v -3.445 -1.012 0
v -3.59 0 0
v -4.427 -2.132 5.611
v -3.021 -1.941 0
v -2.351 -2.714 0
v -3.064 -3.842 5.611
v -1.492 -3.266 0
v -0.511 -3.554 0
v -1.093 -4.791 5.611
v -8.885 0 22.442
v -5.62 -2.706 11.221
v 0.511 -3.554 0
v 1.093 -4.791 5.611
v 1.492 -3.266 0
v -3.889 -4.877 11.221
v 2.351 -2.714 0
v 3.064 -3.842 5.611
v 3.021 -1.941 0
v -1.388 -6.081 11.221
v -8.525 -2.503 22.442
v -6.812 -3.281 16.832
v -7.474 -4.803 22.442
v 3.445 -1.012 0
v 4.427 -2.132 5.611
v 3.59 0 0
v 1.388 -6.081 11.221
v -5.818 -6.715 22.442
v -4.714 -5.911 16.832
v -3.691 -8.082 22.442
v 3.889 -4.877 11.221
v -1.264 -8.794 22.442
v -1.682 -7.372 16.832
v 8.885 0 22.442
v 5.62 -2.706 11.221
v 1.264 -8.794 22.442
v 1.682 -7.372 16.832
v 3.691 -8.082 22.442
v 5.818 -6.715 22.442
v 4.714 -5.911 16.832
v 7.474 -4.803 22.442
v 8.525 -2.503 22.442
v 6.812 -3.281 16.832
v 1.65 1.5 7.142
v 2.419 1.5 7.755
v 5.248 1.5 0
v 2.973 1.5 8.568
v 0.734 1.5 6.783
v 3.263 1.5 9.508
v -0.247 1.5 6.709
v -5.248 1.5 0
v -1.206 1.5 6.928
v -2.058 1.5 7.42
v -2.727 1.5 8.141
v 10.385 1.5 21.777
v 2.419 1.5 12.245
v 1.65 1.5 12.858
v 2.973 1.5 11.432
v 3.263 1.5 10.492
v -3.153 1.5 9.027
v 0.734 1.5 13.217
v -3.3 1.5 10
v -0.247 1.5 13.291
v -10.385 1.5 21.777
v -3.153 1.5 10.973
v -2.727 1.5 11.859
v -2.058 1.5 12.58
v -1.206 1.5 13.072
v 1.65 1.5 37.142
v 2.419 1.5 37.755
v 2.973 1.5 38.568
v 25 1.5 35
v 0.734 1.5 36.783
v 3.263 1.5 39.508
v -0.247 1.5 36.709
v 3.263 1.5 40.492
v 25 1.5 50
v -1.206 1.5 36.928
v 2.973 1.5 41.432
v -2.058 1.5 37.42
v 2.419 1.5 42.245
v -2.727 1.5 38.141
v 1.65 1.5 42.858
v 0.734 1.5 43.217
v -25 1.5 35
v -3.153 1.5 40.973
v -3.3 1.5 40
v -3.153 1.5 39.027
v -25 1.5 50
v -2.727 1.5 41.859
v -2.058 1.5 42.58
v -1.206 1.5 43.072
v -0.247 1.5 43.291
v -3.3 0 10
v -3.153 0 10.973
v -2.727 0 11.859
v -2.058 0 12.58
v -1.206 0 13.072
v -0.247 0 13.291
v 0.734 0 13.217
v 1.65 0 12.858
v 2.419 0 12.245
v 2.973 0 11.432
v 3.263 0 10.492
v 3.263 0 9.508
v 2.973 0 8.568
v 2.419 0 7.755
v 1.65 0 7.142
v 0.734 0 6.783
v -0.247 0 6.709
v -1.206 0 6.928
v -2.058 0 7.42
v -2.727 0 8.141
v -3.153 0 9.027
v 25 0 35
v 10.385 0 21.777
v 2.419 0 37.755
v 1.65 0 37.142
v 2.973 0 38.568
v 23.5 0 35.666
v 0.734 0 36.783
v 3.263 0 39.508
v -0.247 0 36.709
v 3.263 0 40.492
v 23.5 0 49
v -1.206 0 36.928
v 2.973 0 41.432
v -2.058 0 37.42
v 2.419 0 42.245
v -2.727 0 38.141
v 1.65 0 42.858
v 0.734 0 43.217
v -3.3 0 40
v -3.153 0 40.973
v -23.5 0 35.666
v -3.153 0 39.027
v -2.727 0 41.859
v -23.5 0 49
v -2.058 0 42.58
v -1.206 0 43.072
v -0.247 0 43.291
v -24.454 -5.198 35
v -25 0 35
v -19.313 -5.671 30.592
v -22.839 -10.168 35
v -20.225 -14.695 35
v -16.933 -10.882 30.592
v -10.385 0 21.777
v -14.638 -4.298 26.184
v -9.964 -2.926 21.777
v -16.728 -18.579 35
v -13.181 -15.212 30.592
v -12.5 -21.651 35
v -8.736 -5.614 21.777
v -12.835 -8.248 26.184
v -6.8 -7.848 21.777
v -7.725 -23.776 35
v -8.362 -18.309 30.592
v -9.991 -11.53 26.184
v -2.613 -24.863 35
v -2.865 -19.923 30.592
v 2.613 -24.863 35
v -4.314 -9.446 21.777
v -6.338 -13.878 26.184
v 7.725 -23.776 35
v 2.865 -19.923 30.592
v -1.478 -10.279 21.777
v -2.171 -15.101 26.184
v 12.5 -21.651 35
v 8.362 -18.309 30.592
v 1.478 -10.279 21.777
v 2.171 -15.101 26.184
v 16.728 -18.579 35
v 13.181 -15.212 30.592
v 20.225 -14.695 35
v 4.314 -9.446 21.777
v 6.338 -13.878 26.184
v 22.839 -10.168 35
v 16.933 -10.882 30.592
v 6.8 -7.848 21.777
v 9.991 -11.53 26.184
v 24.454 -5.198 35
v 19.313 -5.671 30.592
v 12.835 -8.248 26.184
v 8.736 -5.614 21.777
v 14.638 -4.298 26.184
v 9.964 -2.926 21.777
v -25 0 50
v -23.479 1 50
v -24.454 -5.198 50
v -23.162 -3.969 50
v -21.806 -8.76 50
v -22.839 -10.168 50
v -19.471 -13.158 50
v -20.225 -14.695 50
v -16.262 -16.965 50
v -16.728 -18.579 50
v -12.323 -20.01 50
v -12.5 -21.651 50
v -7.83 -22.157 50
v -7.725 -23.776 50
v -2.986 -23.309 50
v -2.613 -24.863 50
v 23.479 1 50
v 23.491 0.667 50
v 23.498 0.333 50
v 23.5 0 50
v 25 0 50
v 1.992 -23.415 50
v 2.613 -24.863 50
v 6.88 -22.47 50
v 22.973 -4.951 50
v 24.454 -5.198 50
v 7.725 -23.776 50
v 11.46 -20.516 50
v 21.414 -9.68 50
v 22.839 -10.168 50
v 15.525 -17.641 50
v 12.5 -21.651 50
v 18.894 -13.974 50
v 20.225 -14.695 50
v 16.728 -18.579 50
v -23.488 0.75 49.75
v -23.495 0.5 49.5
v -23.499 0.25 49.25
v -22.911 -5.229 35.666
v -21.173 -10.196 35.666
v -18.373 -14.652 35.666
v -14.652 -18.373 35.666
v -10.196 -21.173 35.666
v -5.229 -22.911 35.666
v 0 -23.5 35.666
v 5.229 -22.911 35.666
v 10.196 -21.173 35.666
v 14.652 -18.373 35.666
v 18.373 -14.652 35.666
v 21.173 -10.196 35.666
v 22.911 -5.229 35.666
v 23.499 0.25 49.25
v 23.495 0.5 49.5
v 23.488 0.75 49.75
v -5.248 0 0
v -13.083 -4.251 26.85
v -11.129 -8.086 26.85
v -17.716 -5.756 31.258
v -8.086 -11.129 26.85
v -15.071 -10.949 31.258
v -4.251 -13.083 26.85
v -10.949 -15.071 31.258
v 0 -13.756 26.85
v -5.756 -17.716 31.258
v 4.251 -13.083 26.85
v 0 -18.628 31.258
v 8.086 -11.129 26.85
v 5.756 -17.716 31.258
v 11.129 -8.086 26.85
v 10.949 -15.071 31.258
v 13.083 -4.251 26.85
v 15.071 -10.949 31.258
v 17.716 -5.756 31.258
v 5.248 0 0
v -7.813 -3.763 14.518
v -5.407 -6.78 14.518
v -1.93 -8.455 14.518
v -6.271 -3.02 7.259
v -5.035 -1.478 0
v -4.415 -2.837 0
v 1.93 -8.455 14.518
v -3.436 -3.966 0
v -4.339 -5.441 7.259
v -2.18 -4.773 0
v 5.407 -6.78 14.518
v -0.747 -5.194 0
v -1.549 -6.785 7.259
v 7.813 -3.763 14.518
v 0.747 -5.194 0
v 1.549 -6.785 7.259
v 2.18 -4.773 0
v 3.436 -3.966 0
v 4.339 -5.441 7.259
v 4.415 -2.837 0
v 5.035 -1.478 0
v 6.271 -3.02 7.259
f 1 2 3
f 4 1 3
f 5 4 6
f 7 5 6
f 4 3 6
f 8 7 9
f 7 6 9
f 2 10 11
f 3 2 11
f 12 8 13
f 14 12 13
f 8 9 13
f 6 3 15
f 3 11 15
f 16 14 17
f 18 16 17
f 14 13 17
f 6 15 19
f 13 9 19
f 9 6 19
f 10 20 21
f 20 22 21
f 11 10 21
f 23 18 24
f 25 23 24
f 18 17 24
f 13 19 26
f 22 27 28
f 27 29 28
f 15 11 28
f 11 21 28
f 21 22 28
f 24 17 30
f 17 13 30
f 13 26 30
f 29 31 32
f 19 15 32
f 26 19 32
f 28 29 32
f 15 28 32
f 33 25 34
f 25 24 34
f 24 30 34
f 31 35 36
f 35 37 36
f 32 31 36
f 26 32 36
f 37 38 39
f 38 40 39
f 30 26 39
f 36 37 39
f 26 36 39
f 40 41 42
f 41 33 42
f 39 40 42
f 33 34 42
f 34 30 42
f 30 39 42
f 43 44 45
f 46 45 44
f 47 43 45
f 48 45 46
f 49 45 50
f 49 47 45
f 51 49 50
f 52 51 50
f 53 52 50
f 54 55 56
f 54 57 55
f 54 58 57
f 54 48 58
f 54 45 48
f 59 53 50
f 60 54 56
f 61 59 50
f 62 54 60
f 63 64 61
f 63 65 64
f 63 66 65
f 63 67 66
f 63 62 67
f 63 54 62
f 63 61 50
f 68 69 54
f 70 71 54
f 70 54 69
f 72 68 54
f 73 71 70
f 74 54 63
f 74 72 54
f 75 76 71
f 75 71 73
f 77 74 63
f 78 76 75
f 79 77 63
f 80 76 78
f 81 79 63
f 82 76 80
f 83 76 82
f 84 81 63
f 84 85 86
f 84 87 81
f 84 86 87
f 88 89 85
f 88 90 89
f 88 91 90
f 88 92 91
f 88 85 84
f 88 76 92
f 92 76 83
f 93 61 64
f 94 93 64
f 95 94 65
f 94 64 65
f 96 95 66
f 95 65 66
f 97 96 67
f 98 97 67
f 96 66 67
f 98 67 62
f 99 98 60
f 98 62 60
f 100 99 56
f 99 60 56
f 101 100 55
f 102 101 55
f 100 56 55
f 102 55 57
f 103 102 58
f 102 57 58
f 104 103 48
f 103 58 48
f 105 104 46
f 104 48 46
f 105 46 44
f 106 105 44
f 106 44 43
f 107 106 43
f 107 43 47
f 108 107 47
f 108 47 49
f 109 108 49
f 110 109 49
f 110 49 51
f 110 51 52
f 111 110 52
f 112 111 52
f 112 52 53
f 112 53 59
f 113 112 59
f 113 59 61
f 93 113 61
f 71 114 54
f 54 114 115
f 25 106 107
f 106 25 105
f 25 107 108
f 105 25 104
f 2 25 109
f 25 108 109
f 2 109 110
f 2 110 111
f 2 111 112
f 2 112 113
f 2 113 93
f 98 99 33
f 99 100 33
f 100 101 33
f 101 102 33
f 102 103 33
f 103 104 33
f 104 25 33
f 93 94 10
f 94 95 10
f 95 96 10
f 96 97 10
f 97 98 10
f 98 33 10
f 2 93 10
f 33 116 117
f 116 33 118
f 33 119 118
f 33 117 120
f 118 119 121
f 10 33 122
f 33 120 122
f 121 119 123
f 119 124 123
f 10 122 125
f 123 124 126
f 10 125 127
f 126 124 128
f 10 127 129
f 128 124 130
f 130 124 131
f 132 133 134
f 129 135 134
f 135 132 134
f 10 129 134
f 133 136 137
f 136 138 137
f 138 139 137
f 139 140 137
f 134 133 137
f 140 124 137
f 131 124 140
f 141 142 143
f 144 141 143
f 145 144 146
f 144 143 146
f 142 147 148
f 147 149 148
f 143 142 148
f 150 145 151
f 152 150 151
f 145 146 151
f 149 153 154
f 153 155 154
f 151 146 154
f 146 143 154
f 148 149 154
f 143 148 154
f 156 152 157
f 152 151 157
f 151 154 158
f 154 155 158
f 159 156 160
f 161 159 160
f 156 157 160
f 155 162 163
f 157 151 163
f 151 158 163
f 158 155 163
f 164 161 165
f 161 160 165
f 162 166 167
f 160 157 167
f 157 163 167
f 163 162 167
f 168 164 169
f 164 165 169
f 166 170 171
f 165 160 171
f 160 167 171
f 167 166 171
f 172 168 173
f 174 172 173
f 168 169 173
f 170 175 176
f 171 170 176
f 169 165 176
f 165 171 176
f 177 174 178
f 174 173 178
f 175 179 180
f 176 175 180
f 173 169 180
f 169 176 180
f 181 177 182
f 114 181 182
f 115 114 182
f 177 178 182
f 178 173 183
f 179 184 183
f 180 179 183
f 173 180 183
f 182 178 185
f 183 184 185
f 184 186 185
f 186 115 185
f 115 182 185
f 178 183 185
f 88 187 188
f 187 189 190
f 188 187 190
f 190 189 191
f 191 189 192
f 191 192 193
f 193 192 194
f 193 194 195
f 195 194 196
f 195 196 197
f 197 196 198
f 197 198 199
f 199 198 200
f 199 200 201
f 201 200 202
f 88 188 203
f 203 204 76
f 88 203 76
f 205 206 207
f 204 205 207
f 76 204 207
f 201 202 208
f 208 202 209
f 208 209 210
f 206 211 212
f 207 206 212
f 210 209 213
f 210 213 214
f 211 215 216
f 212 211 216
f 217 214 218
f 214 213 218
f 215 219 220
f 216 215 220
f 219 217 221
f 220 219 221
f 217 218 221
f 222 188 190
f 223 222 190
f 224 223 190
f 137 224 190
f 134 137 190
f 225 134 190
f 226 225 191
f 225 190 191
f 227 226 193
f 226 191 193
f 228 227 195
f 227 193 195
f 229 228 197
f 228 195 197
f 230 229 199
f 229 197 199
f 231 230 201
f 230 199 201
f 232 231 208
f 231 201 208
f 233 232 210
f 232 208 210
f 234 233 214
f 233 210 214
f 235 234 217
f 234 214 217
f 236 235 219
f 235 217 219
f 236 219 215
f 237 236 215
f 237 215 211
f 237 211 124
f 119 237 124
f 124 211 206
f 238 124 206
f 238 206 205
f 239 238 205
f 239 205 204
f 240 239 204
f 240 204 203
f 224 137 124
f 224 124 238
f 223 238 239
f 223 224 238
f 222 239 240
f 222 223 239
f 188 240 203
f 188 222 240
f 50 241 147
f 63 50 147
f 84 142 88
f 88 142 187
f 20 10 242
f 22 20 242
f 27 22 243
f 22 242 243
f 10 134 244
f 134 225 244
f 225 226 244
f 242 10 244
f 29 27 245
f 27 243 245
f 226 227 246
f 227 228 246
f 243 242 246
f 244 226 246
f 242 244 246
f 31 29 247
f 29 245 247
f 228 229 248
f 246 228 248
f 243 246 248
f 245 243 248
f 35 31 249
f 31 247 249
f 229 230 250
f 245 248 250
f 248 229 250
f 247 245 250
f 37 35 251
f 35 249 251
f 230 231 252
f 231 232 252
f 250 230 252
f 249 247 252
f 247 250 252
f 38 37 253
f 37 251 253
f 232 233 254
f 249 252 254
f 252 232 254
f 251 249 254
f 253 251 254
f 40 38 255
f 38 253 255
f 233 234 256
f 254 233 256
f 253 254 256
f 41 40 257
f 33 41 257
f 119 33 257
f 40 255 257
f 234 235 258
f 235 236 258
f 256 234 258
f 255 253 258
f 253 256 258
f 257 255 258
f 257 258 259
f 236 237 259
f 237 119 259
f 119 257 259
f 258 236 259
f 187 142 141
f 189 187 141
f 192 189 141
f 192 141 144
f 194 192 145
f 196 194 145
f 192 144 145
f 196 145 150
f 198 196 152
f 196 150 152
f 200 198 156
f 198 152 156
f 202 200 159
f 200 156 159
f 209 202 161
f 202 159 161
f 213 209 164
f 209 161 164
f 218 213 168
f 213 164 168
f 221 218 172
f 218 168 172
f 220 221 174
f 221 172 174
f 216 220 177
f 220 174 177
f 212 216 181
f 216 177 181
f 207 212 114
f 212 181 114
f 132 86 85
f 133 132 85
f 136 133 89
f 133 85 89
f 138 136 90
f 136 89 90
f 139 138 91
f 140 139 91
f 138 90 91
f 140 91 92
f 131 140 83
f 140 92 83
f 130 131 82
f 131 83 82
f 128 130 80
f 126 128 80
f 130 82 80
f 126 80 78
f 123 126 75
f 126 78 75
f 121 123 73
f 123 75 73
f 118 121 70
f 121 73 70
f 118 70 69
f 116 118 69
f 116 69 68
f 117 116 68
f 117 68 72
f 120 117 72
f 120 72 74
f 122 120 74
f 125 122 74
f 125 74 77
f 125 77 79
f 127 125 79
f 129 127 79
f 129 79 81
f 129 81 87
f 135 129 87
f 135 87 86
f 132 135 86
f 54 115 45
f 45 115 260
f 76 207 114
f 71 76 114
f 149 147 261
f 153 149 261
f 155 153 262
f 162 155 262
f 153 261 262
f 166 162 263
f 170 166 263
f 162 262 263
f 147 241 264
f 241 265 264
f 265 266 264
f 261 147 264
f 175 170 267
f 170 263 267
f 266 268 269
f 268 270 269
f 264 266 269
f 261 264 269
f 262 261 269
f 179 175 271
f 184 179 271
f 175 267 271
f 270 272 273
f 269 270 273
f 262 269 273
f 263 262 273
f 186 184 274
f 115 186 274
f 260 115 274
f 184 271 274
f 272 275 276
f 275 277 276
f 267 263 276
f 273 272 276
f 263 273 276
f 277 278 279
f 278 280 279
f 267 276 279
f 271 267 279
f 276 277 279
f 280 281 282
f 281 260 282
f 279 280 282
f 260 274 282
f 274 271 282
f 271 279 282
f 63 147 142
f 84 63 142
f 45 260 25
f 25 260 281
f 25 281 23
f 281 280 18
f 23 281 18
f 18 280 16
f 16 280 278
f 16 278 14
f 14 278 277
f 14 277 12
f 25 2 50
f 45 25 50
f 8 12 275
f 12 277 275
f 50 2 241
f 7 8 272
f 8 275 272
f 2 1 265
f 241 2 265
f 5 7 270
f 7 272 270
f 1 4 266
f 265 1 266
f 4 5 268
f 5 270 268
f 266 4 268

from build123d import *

# Parameters (mm, degrees)
F2_W        = 80.1923088729
F2_H        = 33.5576944053
F3_DEPTH    = 69.4
F5_DEPTH    = 1.5
F6_R        = 3.3
F7_DEPTH    = 3
F8_T4_DEPTH = 52.1433659759
F8_S5_R     = 23.5
F8_T6_DEPTH = 28


# Not quite as in the source:
# - a fillet or chamfer that OpenCascade refuses, or shapes differently, is made with other operations: its cross-section is extruded or revolved along the edge and cut away or added


with BuildPart() as f1:
    # F0 (on Front) → F1 (revolve)
    with BuildSketch(Plane.XZ):
        Polygon((-23.5, 35.6656860253), (-23.5, 48.5), (-23.5, 50), (-25, 50), (-25, 35), (-10.384612577, 21.7765538924), (-5.247530064, 0), (-3.5904949309, 0), (-8.884612577, 22.4422399178), align=None)
    revolve(axis=Axis((0, 0, 32.1634635329), (0, 0, 1)))

    # F2 (on Top) → F3 (cut)
    with BuildSketch(Plane.XY):
        with Locations((8.9423079044, 16.7788472027)):
            Rectangle(F2_W, F2_H)
    extrude(amount=F3_DEPTH, mode=Mode.SUBTRACT)

    # F4 (on face) → F5 (join)
    with BuildSketch(Plane(origin=(0, 0, 0), x_dir=(-1, 0, 0), z_dir=(0, 1, 0))):
        Polygon((25, 50), (-25, 50), (-25, 35), (-10.384612577, 21.7765538924), (-5.247530064, 0), (5.247530064, 0), (10.384612577, 21.7765538924), (25, 35), align=None)
    extrude(amount=F5_DEPTH)

    # F6 (on face) → F7 (cut)
    with BuildSketch(Plane(origin=(0, 1.5, 0), x_dir=(-1, 0, 0), z_dir=(0, 1, 0))):
        with Locations((0, 40)):
            Circle(F6_R)
        with Locations((0, 10)):
            Circle(F6_R)
    extrude(amount=-F7_DEPTH, mode=Mode.SUBTRACT)

    # F8: chamfer of 1 on 1 edges, made by hand


with BuildPart() as f8_tool2:
    # F8_s3 → F8_t4 (new body)
    with BuildSketch(Plane.YZ.offset(-26.071682988)):
        Polygon((0, 49), (1, 50), (0, 50), align=None)
    extrude(amount=F8_T4_DEPTH)

    # F8_s5 → F8_t6 (intersect, symmetric)
    with BuildSketch(Plane.XY.offset(49.5)):
        Circle(F8_S5_R)
    extrude(amount=F8_T6_DEPTH, both=True, mode=Mode.INTERSECT)


with BuildPart() as f1_1:
    add(f1.part)

    # F8_t1: cut F8_tool2
    add(f8_tool2.part, mode=Mode.SUBTRACT)


solid = f1_1.part
